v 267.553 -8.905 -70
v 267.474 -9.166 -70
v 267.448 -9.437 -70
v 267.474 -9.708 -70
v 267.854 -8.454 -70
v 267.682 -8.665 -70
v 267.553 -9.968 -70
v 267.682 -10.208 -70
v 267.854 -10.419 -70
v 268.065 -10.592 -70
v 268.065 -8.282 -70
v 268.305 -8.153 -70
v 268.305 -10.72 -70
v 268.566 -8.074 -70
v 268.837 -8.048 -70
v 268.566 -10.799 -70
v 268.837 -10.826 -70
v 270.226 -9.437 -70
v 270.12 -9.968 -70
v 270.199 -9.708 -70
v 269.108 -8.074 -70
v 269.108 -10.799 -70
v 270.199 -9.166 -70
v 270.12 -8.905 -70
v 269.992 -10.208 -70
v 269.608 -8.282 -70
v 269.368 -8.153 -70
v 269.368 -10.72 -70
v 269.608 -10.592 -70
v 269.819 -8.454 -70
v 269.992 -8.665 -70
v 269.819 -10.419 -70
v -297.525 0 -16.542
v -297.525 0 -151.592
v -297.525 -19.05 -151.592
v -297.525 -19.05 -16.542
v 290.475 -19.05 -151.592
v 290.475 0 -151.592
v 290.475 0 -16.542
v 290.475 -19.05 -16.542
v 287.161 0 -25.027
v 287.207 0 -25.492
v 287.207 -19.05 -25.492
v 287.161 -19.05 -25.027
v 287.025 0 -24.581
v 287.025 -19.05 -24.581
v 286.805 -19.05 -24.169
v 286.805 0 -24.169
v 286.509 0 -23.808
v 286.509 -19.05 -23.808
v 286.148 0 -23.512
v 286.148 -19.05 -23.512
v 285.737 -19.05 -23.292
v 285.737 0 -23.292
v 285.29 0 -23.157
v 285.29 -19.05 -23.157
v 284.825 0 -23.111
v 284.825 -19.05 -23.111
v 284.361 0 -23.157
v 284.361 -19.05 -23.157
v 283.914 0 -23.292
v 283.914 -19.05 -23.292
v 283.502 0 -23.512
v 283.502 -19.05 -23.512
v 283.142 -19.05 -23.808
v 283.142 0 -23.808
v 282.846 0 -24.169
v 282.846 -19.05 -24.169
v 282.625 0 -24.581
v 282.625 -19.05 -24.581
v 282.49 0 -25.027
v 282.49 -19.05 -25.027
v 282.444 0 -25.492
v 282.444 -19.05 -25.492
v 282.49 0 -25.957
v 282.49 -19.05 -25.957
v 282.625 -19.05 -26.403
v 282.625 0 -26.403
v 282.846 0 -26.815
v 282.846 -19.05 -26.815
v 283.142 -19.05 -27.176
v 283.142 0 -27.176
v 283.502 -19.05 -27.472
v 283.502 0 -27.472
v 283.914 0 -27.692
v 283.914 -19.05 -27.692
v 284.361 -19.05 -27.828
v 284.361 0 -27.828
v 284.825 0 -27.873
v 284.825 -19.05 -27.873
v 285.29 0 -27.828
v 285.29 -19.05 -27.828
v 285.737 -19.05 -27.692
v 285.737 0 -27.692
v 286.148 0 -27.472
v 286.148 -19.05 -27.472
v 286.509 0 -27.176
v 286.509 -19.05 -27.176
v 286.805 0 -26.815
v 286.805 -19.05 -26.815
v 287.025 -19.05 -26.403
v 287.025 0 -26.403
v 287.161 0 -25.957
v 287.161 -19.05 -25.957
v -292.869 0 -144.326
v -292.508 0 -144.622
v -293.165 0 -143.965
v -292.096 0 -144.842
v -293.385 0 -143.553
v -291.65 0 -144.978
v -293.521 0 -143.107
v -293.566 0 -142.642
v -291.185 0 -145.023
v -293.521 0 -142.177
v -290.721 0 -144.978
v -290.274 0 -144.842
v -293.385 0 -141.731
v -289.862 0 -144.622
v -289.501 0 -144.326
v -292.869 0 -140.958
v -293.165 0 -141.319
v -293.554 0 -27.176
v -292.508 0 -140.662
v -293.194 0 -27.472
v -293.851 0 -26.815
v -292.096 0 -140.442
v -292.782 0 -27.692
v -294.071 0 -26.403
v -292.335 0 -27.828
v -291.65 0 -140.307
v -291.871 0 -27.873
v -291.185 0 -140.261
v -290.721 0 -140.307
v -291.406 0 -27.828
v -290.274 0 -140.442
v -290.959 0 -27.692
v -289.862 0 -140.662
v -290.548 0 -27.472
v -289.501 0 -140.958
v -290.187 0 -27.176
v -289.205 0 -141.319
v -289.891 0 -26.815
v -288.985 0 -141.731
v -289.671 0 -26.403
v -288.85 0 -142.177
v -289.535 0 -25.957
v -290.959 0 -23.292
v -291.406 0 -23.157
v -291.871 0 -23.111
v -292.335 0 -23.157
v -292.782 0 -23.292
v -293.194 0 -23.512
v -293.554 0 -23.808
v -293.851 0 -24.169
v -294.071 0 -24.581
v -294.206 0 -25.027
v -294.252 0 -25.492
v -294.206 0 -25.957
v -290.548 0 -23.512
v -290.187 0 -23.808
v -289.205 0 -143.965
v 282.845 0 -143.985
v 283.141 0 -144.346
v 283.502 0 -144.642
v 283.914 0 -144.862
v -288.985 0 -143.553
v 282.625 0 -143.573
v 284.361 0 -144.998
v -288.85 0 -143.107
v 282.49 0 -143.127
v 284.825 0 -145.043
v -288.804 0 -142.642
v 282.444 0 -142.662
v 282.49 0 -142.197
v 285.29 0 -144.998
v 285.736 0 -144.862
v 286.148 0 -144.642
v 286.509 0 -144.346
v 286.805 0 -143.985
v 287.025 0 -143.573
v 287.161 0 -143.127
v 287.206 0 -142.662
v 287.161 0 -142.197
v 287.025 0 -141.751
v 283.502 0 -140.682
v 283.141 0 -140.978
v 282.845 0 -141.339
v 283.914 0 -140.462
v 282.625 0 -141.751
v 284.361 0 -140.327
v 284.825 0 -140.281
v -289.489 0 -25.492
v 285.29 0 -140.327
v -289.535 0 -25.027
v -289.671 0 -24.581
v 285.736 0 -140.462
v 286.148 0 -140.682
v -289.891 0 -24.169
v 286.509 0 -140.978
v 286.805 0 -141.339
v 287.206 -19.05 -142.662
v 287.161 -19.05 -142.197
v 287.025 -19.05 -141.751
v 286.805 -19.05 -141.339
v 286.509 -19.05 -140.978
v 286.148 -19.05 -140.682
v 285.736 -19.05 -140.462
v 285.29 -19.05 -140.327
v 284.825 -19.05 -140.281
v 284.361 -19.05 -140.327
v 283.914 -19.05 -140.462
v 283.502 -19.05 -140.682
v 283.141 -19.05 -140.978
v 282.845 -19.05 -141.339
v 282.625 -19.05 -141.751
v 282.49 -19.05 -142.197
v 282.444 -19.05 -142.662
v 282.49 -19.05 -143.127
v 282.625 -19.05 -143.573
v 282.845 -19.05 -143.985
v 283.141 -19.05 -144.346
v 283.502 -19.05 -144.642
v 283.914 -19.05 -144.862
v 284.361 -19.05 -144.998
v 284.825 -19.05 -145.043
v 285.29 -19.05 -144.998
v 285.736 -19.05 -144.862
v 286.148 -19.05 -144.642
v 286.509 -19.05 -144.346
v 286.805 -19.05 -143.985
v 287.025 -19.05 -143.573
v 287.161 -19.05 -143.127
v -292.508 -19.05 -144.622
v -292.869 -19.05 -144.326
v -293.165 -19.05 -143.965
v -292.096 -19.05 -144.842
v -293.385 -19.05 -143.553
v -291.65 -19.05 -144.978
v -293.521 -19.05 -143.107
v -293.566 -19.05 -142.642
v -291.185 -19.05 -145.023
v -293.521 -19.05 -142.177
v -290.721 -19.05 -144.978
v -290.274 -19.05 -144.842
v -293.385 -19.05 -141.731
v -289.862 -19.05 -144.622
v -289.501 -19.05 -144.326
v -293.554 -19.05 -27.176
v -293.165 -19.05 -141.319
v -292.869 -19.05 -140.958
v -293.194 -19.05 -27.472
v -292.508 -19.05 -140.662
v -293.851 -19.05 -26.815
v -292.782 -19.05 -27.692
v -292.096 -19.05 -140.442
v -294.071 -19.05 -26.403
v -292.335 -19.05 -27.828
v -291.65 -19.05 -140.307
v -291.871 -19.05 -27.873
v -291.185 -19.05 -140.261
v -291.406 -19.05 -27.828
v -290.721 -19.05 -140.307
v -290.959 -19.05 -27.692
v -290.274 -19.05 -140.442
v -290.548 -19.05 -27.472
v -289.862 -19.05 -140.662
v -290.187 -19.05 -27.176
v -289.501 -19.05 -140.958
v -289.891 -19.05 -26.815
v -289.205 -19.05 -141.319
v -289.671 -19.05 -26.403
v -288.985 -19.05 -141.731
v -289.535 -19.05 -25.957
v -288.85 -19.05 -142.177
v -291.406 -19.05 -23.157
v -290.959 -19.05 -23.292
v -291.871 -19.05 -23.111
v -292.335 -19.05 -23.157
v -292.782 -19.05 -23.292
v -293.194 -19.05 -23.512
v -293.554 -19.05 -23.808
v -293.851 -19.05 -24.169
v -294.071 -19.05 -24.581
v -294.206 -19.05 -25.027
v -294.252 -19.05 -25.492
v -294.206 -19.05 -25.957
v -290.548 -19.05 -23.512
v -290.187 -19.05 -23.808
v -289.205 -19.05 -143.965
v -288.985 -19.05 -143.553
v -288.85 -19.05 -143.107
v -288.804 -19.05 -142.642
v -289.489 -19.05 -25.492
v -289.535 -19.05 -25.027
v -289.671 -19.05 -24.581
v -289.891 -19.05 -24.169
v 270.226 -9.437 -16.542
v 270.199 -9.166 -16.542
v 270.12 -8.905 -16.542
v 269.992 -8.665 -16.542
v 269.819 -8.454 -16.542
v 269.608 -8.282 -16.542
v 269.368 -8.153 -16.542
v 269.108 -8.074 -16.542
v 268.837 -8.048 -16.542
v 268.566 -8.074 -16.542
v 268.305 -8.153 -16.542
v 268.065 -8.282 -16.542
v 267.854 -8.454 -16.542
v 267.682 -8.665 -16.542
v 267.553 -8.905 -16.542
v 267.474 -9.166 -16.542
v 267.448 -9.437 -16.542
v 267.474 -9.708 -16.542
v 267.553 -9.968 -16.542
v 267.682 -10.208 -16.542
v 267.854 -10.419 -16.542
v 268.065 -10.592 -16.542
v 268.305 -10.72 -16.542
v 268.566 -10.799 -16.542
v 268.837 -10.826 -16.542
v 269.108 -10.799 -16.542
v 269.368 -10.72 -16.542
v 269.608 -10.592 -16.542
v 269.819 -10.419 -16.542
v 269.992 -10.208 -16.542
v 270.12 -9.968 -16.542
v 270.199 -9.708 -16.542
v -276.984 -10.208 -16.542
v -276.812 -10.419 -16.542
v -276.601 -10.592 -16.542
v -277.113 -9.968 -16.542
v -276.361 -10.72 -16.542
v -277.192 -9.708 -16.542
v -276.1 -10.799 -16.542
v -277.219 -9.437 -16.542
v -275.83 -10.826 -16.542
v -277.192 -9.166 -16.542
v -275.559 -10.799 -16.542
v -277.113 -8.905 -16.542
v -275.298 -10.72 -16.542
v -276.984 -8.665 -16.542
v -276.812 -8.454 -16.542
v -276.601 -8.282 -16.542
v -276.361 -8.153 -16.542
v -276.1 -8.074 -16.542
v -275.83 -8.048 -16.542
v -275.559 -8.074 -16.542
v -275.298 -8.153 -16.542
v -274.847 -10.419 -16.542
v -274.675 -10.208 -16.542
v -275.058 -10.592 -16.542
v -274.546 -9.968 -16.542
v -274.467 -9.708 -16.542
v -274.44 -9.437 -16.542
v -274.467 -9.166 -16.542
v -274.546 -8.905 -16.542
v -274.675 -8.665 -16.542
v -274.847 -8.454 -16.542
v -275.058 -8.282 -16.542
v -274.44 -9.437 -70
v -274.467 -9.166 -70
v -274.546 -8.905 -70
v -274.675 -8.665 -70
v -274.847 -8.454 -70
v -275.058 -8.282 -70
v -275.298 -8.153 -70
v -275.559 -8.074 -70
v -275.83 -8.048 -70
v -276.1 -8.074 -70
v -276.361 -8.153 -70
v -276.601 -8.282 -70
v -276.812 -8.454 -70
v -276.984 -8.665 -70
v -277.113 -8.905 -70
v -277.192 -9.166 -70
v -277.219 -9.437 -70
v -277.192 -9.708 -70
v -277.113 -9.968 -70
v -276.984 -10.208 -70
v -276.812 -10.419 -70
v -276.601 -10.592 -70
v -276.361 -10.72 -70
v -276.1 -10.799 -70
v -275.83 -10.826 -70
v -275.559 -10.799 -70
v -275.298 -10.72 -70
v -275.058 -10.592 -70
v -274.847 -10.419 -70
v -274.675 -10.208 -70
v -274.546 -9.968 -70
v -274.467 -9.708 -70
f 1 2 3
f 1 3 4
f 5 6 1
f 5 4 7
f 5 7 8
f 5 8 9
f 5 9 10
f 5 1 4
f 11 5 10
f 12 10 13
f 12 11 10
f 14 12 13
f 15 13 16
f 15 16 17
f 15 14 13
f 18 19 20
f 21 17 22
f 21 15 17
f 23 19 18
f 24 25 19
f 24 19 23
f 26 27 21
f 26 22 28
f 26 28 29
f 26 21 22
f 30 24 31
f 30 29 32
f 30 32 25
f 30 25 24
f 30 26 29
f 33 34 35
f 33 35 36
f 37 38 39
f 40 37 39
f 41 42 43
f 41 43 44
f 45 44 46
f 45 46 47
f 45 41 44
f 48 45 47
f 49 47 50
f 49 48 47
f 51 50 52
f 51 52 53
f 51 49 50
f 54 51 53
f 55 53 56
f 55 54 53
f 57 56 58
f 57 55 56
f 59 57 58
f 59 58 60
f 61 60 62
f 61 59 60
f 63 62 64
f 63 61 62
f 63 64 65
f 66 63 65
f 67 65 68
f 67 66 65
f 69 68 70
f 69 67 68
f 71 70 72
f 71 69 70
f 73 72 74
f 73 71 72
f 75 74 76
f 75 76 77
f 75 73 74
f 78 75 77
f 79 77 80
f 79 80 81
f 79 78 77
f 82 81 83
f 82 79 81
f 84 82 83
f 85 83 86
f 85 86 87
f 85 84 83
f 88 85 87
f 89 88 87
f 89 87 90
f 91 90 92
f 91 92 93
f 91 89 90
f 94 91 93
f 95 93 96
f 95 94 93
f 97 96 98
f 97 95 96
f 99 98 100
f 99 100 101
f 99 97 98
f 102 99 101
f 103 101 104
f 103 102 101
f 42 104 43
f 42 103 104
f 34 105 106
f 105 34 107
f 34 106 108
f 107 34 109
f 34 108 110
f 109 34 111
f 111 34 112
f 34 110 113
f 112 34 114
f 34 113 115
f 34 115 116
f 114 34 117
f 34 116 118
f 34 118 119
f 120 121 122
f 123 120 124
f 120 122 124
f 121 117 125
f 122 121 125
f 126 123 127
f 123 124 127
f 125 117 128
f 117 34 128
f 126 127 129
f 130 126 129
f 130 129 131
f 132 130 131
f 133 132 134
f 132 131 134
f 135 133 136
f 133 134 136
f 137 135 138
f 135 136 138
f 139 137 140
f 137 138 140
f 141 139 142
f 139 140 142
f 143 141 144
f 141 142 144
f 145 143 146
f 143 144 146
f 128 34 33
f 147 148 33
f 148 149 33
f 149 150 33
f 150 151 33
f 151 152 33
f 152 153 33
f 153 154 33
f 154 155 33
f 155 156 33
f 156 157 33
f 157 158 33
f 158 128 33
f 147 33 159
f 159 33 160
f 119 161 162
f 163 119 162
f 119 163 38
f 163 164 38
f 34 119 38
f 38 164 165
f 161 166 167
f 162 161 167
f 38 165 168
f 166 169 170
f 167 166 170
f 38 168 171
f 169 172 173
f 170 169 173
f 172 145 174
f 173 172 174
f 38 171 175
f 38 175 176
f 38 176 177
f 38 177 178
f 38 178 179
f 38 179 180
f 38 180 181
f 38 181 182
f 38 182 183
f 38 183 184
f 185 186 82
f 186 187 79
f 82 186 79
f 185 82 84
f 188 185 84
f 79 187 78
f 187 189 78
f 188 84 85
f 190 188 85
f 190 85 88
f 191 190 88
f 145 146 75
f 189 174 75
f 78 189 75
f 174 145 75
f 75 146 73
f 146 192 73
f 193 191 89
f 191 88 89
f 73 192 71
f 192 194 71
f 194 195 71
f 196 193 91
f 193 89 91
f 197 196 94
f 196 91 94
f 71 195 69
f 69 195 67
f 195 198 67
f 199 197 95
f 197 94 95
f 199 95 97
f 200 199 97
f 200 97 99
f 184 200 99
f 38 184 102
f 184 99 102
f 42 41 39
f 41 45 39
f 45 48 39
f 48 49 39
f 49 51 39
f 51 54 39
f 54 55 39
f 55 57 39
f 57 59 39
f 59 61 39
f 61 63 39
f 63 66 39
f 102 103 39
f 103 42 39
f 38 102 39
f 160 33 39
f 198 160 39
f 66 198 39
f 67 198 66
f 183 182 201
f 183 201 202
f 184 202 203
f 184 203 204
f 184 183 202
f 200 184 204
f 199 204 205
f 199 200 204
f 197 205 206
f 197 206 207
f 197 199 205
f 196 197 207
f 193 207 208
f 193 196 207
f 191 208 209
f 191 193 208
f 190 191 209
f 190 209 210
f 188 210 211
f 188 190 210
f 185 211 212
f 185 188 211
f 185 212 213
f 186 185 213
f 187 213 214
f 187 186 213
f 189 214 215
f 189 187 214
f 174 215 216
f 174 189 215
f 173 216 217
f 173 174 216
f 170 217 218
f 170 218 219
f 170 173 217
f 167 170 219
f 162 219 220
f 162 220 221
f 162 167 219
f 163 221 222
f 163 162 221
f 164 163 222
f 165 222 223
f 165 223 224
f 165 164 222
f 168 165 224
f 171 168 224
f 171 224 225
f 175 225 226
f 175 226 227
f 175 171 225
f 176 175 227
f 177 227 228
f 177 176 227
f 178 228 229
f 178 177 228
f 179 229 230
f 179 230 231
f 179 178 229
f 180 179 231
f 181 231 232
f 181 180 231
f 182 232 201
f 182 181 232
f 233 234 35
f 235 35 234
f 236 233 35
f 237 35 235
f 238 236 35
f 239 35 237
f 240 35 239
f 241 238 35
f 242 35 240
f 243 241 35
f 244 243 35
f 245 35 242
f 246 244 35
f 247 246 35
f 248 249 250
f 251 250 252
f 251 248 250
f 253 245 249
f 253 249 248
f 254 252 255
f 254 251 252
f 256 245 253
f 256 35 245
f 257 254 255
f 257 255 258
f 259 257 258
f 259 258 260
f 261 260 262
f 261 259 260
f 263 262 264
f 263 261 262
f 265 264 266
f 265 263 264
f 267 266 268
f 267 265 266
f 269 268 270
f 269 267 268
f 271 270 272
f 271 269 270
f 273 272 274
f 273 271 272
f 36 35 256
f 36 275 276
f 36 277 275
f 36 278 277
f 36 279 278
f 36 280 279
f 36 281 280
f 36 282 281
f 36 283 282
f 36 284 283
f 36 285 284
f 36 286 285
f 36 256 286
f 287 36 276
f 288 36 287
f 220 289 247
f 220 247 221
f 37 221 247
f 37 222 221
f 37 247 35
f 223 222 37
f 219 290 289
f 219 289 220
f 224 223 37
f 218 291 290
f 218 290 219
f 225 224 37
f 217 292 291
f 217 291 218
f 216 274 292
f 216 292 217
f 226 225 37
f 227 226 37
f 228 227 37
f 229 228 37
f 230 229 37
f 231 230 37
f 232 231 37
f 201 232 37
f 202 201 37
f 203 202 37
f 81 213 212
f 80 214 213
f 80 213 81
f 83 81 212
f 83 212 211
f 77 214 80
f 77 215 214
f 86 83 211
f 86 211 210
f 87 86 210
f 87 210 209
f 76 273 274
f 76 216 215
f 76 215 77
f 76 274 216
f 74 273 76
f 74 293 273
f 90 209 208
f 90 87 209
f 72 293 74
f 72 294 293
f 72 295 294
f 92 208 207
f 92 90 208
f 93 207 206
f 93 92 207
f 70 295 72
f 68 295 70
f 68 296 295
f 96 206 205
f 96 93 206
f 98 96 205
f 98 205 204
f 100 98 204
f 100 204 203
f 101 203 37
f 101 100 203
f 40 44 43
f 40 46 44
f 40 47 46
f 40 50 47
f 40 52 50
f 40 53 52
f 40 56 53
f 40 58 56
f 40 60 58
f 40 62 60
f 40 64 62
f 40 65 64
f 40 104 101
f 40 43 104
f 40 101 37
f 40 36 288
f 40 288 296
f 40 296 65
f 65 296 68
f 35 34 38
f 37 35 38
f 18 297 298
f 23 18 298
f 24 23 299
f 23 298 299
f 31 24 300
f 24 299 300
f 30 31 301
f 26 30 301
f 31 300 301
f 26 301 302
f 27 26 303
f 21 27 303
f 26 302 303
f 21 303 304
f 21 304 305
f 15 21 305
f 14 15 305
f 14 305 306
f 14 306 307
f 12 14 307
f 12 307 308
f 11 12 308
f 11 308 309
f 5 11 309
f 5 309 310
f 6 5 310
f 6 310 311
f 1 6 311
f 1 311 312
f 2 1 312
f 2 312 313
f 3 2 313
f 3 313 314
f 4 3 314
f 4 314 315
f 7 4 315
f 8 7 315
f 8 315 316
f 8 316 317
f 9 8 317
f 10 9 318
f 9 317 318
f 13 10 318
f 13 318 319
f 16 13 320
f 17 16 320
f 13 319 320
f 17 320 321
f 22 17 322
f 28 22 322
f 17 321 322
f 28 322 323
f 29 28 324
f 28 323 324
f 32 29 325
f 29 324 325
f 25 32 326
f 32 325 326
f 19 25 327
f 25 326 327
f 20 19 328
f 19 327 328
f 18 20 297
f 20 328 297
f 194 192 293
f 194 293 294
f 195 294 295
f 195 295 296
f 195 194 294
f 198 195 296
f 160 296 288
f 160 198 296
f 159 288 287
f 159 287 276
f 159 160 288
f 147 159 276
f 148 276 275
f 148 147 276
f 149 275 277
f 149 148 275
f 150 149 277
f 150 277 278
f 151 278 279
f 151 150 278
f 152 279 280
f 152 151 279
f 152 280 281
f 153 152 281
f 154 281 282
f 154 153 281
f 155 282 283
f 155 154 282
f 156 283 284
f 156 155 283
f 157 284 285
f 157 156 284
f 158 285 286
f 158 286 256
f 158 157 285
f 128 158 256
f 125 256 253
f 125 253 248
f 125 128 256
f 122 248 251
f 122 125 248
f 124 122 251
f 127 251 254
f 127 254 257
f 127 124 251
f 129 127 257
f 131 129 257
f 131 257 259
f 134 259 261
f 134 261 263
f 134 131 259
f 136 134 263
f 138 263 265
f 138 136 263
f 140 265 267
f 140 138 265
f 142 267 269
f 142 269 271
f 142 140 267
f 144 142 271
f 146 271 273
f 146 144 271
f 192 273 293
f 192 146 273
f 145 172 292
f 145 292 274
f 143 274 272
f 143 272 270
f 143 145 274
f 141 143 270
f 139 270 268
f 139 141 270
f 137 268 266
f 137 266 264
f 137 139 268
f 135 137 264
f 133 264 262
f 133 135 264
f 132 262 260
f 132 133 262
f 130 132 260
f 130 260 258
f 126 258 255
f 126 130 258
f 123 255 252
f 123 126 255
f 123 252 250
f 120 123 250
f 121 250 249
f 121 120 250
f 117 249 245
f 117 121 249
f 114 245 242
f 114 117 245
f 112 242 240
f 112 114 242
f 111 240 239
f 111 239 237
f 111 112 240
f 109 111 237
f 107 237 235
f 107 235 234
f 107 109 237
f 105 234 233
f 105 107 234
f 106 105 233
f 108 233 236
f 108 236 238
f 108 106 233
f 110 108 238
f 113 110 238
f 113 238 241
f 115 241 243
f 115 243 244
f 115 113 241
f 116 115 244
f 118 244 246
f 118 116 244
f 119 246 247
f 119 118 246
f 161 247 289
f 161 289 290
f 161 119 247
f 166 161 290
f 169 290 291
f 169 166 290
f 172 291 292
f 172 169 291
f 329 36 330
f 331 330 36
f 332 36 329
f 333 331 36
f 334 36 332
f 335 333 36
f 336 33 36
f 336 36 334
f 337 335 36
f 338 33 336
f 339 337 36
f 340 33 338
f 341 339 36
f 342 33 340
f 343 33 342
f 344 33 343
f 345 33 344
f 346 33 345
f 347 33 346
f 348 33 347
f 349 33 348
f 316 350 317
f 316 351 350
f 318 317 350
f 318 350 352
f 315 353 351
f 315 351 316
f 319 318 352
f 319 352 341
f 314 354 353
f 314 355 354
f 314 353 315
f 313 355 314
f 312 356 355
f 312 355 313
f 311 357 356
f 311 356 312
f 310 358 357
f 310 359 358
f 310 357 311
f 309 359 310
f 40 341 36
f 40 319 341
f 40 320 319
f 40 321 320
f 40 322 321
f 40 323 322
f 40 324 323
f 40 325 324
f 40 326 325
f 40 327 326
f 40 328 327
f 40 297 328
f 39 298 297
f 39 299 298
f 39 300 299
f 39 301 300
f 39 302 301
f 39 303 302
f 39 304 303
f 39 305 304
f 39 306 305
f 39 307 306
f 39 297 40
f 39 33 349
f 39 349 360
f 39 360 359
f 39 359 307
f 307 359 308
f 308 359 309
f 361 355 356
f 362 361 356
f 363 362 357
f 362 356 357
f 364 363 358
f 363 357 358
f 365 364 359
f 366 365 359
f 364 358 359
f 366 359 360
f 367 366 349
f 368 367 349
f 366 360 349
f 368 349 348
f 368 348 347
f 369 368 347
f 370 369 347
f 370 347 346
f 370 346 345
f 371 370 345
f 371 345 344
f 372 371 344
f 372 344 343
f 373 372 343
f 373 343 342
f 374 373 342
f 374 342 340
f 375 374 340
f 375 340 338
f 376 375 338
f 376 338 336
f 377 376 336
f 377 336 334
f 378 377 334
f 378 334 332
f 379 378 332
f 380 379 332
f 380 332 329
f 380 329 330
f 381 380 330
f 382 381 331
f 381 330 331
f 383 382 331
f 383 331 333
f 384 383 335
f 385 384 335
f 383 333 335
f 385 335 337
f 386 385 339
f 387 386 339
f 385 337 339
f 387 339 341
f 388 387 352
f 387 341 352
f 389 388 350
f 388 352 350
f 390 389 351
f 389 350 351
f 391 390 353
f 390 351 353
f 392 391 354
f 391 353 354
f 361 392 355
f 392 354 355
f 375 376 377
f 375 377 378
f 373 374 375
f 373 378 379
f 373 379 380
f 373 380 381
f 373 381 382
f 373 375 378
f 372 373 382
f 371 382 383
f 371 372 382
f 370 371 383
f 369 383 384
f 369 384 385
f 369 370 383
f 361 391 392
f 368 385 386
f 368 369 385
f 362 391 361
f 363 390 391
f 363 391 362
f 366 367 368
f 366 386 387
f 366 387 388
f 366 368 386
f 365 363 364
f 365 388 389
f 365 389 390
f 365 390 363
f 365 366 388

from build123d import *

# Parameters (mm, degrees)
F0_W     = 588
F0_H     = 135.05
F0_R     = 2.38125
F1_DEPTH = 19.05
F2_R     = 1.389063
F3_DEPTH = 70
F4_DEPTH = 19.05
F5_DEPTH = 70


with BuildPart() as f1:
    # F0 (on Front) → F1 (new body)
    with BuildSketch(Plane.XZ):
        with Locations((-3.524796, -84.067022)):
            Rectangle(F0_W, F0_H)
        with Locations((-291.185114, -142.642022)):
            Circle(F0_R, mode=Mode.SUBTRACT)
        with Locations((284.825206, -142.662022)):
            Circle(F0_R, mode=Mode.SUBTRACT)
        with Locations((-291.870666, -25.492022)):
            Circle(F0_R, mode=Mode.SUBTRACT)
        with Locations((284.825444, -25.492022)):
            Circle(F0_R, mode=Mode.SUBTRACT)
    extrude(amount=F1_DEPTH)

    # F2 (on Top) → F3 (cut)
    with BuildSketch(Plane.XY):
        with Locations((-275.8295, -9.436668)):
            Circle(F2_R)
        with Locations((268.836658, -9.436668)):
            Circle(F2_R)
    extrude(amount=-F3_DEPTH, mode=Mode.SUBTRACT)

    # F0 (on Front) → F4 (cut)
    with BuildSketch(Plane.XZ):
        with Locations((-3.524796, -84.067022)):
            Rectangle(F0_W, F0_H)
        with Locations((-291.185114, -142.642022)):
            Circle(F0_R, mode=Mode.SUBTRACT)
        with Locations((284.825206, -142.662022)):
            Circle(F0_R, mode=Mode.SUBTRACT)
        with Locations((-291.870666, -25.492022)):
            Circle(F0_R, mode=Mode.SUBTRACT)
        with Locations((284.825444, -25.492022)):
            Circle(F0_R, mode=Mode.SUBTRACT)
    extrude(amount=-F4_DEPTH, mode=Mode.SUBTRACT)

    # F2 (on Top) → F5 (cut)
    with BuildSketch(Plane.XY):
        with Locations((-275.8295, -9.436668)):
            Circle(F2_R)
        with Locations((268.836658, -9.436668)):
            Circle(F2_R)
    extrude(amount=-F5_DEPTH, mode=Mode.SUBTRACT)


solid = f1.part
